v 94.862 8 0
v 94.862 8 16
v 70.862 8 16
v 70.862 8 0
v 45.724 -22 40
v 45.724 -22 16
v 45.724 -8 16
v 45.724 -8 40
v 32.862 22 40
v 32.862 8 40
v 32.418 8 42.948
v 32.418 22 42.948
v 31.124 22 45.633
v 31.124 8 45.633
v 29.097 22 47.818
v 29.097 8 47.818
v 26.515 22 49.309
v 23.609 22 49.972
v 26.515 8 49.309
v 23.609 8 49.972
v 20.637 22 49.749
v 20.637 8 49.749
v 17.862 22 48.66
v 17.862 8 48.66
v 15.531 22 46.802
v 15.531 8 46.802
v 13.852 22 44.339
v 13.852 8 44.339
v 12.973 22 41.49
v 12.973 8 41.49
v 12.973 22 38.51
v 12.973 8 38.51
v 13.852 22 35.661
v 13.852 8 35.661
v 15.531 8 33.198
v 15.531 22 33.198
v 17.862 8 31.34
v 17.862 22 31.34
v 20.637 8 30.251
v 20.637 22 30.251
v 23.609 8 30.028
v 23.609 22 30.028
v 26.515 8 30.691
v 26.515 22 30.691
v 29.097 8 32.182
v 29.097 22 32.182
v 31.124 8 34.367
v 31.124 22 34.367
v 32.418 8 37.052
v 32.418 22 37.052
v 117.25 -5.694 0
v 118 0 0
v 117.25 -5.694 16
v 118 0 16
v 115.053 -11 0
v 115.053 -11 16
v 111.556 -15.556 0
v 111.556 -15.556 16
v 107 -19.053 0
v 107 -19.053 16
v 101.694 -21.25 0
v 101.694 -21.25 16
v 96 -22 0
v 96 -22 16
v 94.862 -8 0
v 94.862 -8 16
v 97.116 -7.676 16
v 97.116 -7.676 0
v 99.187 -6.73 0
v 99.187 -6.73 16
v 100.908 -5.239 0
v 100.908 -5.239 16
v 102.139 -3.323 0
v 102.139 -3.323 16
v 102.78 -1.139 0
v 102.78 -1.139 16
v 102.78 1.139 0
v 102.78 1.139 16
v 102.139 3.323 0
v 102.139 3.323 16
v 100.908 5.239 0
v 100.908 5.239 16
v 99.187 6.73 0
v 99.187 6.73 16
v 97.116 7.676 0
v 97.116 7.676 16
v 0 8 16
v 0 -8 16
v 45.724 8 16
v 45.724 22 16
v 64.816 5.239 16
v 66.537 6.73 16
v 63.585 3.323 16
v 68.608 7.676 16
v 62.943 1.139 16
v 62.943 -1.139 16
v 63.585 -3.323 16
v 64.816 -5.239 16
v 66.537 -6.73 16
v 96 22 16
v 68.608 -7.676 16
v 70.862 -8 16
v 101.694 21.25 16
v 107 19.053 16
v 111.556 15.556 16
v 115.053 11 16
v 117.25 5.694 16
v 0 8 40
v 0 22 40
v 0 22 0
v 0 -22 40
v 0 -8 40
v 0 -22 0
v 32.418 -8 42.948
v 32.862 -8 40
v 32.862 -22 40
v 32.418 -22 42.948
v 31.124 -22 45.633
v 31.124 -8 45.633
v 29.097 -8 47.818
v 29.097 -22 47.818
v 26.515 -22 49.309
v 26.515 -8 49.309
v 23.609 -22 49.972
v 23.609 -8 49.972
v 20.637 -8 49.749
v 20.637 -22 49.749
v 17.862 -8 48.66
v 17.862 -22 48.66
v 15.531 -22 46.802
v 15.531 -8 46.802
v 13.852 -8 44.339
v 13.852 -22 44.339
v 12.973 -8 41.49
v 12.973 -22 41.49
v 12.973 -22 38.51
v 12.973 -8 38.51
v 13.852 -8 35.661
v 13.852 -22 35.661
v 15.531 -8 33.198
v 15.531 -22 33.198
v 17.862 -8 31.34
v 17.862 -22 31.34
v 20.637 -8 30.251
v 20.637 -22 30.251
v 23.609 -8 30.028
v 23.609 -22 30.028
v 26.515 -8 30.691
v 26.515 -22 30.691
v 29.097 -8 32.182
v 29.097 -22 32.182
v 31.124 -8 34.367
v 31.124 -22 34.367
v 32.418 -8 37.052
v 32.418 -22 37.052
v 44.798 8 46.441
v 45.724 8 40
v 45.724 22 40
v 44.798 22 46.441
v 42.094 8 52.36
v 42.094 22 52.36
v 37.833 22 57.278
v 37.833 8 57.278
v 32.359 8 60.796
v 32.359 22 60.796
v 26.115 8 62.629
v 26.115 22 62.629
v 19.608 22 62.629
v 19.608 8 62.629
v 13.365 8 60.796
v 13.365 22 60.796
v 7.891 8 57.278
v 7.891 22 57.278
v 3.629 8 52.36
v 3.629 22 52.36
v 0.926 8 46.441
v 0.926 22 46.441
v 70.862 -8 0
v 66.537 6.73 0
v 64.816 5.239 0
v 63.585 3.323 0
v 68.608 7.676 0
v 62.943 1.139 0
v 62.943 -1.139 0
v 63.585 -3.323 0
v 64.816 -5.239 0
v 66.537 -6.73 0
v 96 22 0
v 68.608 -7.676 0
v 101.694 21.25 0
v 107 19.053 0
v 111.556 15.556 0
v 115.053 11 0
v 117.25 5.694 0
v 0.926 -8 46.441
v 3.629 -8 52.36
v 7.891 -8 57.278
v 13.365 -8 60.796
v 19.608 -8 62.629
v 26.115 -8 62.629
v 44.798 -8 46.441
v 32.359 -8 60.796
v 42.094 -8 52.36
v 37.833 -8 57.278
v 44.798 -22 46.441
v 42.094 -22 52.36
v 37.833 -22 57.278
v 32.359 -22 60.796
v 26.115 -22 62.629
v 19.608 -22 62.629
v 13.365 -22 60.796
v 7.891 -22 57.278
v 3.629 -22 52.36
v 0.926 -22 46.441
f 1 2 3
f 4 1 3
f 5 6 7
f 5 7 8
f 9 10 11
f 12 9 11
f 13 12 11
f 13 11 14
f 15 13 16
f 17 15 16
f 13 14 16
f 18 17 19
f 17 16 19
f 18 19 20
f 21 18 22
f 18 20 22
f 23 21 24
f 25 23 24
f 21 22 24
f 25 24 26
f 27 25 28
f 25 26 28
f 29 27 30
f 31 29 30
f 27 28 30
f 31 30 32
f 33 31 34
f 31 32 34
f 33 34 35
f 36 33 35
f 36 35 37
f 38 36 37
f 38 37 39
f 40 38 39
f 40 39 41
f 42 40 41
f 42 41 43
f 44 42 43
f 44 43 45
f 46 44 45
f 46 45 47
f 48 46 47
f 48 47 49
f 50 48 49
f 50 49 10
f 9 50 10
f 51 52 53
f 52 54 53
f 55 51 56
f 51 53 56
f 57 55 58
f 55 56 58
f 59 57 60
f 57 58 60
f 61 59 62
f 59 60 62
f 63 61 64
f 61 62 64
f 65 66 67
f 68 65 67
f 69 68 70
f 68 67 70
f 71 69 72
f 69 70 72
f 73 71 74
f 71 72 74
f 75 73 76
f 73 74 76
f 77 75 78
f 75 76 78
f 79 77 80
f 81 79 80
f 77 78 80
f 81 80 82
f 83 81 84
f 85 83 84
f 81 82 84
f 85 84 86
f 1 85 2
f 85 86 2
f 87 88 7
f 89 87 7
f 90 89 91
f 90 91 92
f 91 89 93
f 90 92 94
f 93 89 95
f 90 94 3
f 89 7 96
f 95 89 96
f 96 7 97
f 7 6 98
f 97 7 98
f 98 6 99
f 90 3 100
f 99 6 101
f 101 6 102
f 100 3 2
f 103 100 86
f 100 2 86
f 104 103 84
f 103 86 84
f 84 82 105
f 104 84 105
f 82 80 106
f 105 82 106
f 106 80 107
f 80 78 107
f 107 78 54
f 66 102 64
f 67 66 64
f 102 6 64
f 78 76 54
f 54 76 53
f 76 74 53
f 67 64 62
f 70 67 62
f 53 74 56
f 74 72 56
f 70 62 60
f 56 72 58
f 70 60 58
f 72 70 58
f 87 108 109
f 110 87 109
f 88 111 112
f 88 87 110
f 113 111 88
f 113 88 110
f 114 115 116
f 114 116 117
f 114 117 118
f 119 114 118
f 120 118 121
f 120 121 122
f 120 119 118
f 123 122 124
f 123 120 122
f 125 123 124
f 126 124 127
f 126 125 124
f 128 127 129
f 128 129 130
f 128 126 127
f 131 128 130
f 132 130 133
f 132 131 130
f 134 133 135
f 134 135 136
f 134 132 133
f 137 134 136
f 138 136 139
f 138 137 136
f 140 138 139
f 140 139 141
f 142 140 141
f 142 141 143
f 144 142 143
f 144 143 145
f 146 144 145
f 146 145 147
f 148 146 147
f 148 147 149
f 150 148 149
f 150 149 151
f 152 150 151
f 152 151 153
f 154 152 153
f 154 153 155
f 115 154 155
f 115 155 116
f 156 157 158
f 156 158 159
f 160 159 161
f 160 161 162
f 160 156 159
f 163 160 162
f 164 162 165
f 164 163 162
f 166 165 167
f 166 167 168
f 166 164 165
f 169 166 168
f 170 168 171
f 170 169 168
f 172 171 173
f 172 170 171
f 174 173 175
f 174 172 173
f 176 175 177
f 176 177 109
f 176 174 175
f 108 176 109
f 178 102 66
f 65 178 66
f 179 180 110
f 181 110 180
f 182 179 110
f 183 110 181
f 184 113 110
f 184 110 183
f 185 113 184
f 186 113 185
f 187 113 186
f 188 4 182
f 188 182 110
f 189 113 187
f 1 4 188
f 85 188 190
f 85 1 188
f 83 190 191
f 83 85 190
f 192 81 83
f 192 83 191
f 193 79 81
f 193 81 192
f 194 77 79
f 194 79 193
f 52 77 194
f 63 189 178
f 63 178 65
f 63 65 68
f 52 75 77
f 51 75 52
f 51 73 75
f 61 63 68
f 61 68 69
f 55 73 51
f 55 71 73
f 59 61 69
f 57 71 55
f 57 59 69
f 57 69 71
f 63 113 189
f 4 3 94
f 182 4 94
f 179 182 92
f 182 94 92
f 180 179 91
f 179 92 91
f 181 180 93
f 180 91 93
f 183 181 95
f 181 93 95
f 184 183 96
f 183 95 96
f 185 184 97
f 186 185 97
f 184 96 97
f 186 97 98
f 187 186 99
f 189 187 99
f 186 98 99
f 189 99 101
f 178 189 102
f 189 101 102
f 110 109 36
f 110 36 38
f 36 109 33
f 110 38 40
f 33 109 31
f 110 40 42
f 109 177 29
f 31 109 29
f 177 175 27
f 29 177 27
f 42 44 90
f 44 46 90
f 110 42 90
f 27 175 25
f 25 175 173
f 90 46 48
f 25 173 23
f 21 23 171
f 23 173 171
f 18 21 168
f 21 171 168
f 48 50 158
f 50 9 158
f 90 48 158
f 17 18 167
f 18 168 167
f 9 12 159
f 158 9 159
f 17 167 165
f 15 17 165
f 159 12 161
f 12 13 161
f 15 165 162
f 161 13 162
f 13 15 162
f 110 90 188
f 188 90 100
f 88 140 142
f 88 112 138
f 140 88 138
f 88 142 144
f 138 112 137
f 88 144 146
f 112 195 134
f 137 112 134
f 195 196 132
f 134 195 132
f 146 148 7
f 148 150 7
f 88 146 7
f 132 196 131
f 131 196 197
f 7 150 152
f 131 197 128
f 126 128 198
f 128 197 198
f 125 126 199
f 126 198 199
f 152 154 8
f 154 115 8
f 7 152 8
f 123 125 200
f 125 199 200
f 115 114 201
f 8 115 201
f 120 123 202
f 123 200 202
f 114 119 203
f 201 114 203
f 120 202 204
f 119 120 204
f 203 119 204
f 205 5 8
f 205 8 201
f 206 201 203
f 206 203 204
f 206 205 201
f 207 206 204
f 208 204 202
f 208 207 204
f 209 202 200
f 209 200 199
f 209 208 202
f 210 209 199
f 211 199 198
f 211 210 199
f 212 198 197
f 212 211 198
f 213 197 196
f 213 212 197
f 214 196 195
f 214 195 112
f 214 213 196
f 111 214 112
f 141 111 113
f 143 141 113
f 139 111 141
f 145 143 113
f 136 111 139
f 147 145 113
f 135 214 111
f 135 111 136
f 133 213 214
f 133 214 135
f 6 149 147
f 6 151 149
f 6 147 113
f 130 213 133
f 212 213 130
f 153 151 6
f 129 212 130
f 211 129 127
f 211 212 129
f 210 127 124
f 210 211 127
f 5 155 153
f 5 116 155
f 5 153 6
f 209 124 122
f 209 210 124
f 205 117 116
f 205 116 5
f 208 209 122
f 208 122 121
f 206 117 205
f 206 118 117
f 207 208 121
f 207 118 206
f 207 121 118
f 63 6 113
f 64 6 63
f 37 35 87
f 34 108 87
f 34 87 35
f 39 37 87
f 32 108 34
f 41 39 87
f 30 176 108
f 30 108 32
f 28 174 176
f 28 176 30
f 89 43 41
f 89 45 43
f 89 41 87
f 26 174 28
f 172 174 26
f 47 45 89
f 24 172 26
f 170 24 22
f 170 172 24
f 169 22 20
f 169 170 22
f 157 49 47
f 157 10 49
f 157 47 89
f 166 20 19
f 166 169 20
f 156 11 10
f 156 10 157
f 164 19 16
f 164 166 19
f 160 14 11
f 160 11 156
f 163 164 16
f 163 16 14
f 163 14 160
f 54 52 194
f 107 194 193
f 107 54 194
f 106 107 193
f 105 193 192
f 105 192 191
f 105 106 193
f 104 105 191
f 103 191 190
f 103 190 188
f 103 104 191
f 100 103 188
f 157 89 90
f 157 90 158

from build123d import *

# Parameters (mm, degrees)
F0_R          = 10
F1_DEPTH      = 22
F1_DEPTH_BACK = 22
F2_DEPTH      = 8
F2_DEPTH_BACK = 8
F3_R          = 21.99999
F5_DEPTH      = 25


# Not quite as in the source:
# - a fillet or chamfer is up to 0.001 mm smaller than in the source, because OpenCascade refuses the exact size


with BuildPart() as f1:
    # F0 (on Front) → F1 (new body, two sides)
    with BuildSketch(Plane.XZ) as f1_sk:
        with BuildLine():
            Line((0, 40), (0, 16))
            Line((0, 16), (45.7235909998, 16))
            Line((45.7235909998, 16), (45.7235909998, 40))
            ThreePointArc((45.7235909998, 40), (22.8617954999, 62.8617954999), (0, 40))
        make_face()
        with Locations((22.8617954999, 40)):
            Circle(F0_R, mode=Mode.SUBTRACT)
        Polygon((0, 16), (0, 0), (118, 0), (118, 16), (45.7235909998, 16), align=None)
    extrude(amount=F1_DEPTH)
    extrude(f1_sk.sketch, amount=-F1_DEPTH_BACK)

    # F0 (on Front) → F2 (cut, two sides)
    with BuildSketch(Plane.XZ) as f2_sk:
        with BuildLine():
            Line((45.7235909998, 16), (118, 16))
            Line((118, 16), (118, 71.8919485807))
            Line((118, 71.8919485807), (0, 71.8919485807))
            Line((0, 71.8919485807), (0, 40))
            ThreePointArc((0, 40), (22.8617954999, 62.8617954999), (45.7235909998, 40))
            Line((45.7235909998, 40), (45.7235909998, 16))
        make_face()
        with BuildLine():
            Line((0, 40), (0, 16))
            Line((0, 16), (45.7235909998, 16))
            Line((45.7235909998, 16), (45.7235909998, 40))
            ThreePointArc((45.7235909998, 40), (22.8617954999, 62.8617954999), (0, 40))
        make_face()
        with Locations((22.8617954999, 40)):
            Circle(F0_R, mode=Mode.SUBTRACT)
    extrude(amount=-F2_DEPTH, mode=Mode.SUBTRACT)
    extrude(f2_sk.sketch, amount=F2_DEPTH_BACK, mode=Mode.SUBTRACT)

    # F3 (radius 22 in the source; OpenCascade refuses exactly that, so slightly less here)
    f3_edges = [f1.edges().sort_by_distance(p)[0] for p in [
        (118, -22, 8),
        (118, 22, 8),
    ]]
    fillet(f3_edges, radius=F3_R)

    # F4 (on face) → F5 (cut)
    with BuildSketch(Plane.XY.offset(16)):
        with BuildLine():
            ThreePointArc((70.8617954999, 8), (62.8617954999, 0), (70.8617954999, -8))
            Line((70.8617954999, -8), (94.8617954999, -8))
            ThreePointArc((94.8617954999, -8), (102.8617954999, 0), (94.8617954999, 8))
            Line((94.8617954999, 8), (70.8617954999, 8))
        make_face()
    extrude(amount=-F5_DEPTH, mode=Mode.SUBTRACT)


solid = f1.part
